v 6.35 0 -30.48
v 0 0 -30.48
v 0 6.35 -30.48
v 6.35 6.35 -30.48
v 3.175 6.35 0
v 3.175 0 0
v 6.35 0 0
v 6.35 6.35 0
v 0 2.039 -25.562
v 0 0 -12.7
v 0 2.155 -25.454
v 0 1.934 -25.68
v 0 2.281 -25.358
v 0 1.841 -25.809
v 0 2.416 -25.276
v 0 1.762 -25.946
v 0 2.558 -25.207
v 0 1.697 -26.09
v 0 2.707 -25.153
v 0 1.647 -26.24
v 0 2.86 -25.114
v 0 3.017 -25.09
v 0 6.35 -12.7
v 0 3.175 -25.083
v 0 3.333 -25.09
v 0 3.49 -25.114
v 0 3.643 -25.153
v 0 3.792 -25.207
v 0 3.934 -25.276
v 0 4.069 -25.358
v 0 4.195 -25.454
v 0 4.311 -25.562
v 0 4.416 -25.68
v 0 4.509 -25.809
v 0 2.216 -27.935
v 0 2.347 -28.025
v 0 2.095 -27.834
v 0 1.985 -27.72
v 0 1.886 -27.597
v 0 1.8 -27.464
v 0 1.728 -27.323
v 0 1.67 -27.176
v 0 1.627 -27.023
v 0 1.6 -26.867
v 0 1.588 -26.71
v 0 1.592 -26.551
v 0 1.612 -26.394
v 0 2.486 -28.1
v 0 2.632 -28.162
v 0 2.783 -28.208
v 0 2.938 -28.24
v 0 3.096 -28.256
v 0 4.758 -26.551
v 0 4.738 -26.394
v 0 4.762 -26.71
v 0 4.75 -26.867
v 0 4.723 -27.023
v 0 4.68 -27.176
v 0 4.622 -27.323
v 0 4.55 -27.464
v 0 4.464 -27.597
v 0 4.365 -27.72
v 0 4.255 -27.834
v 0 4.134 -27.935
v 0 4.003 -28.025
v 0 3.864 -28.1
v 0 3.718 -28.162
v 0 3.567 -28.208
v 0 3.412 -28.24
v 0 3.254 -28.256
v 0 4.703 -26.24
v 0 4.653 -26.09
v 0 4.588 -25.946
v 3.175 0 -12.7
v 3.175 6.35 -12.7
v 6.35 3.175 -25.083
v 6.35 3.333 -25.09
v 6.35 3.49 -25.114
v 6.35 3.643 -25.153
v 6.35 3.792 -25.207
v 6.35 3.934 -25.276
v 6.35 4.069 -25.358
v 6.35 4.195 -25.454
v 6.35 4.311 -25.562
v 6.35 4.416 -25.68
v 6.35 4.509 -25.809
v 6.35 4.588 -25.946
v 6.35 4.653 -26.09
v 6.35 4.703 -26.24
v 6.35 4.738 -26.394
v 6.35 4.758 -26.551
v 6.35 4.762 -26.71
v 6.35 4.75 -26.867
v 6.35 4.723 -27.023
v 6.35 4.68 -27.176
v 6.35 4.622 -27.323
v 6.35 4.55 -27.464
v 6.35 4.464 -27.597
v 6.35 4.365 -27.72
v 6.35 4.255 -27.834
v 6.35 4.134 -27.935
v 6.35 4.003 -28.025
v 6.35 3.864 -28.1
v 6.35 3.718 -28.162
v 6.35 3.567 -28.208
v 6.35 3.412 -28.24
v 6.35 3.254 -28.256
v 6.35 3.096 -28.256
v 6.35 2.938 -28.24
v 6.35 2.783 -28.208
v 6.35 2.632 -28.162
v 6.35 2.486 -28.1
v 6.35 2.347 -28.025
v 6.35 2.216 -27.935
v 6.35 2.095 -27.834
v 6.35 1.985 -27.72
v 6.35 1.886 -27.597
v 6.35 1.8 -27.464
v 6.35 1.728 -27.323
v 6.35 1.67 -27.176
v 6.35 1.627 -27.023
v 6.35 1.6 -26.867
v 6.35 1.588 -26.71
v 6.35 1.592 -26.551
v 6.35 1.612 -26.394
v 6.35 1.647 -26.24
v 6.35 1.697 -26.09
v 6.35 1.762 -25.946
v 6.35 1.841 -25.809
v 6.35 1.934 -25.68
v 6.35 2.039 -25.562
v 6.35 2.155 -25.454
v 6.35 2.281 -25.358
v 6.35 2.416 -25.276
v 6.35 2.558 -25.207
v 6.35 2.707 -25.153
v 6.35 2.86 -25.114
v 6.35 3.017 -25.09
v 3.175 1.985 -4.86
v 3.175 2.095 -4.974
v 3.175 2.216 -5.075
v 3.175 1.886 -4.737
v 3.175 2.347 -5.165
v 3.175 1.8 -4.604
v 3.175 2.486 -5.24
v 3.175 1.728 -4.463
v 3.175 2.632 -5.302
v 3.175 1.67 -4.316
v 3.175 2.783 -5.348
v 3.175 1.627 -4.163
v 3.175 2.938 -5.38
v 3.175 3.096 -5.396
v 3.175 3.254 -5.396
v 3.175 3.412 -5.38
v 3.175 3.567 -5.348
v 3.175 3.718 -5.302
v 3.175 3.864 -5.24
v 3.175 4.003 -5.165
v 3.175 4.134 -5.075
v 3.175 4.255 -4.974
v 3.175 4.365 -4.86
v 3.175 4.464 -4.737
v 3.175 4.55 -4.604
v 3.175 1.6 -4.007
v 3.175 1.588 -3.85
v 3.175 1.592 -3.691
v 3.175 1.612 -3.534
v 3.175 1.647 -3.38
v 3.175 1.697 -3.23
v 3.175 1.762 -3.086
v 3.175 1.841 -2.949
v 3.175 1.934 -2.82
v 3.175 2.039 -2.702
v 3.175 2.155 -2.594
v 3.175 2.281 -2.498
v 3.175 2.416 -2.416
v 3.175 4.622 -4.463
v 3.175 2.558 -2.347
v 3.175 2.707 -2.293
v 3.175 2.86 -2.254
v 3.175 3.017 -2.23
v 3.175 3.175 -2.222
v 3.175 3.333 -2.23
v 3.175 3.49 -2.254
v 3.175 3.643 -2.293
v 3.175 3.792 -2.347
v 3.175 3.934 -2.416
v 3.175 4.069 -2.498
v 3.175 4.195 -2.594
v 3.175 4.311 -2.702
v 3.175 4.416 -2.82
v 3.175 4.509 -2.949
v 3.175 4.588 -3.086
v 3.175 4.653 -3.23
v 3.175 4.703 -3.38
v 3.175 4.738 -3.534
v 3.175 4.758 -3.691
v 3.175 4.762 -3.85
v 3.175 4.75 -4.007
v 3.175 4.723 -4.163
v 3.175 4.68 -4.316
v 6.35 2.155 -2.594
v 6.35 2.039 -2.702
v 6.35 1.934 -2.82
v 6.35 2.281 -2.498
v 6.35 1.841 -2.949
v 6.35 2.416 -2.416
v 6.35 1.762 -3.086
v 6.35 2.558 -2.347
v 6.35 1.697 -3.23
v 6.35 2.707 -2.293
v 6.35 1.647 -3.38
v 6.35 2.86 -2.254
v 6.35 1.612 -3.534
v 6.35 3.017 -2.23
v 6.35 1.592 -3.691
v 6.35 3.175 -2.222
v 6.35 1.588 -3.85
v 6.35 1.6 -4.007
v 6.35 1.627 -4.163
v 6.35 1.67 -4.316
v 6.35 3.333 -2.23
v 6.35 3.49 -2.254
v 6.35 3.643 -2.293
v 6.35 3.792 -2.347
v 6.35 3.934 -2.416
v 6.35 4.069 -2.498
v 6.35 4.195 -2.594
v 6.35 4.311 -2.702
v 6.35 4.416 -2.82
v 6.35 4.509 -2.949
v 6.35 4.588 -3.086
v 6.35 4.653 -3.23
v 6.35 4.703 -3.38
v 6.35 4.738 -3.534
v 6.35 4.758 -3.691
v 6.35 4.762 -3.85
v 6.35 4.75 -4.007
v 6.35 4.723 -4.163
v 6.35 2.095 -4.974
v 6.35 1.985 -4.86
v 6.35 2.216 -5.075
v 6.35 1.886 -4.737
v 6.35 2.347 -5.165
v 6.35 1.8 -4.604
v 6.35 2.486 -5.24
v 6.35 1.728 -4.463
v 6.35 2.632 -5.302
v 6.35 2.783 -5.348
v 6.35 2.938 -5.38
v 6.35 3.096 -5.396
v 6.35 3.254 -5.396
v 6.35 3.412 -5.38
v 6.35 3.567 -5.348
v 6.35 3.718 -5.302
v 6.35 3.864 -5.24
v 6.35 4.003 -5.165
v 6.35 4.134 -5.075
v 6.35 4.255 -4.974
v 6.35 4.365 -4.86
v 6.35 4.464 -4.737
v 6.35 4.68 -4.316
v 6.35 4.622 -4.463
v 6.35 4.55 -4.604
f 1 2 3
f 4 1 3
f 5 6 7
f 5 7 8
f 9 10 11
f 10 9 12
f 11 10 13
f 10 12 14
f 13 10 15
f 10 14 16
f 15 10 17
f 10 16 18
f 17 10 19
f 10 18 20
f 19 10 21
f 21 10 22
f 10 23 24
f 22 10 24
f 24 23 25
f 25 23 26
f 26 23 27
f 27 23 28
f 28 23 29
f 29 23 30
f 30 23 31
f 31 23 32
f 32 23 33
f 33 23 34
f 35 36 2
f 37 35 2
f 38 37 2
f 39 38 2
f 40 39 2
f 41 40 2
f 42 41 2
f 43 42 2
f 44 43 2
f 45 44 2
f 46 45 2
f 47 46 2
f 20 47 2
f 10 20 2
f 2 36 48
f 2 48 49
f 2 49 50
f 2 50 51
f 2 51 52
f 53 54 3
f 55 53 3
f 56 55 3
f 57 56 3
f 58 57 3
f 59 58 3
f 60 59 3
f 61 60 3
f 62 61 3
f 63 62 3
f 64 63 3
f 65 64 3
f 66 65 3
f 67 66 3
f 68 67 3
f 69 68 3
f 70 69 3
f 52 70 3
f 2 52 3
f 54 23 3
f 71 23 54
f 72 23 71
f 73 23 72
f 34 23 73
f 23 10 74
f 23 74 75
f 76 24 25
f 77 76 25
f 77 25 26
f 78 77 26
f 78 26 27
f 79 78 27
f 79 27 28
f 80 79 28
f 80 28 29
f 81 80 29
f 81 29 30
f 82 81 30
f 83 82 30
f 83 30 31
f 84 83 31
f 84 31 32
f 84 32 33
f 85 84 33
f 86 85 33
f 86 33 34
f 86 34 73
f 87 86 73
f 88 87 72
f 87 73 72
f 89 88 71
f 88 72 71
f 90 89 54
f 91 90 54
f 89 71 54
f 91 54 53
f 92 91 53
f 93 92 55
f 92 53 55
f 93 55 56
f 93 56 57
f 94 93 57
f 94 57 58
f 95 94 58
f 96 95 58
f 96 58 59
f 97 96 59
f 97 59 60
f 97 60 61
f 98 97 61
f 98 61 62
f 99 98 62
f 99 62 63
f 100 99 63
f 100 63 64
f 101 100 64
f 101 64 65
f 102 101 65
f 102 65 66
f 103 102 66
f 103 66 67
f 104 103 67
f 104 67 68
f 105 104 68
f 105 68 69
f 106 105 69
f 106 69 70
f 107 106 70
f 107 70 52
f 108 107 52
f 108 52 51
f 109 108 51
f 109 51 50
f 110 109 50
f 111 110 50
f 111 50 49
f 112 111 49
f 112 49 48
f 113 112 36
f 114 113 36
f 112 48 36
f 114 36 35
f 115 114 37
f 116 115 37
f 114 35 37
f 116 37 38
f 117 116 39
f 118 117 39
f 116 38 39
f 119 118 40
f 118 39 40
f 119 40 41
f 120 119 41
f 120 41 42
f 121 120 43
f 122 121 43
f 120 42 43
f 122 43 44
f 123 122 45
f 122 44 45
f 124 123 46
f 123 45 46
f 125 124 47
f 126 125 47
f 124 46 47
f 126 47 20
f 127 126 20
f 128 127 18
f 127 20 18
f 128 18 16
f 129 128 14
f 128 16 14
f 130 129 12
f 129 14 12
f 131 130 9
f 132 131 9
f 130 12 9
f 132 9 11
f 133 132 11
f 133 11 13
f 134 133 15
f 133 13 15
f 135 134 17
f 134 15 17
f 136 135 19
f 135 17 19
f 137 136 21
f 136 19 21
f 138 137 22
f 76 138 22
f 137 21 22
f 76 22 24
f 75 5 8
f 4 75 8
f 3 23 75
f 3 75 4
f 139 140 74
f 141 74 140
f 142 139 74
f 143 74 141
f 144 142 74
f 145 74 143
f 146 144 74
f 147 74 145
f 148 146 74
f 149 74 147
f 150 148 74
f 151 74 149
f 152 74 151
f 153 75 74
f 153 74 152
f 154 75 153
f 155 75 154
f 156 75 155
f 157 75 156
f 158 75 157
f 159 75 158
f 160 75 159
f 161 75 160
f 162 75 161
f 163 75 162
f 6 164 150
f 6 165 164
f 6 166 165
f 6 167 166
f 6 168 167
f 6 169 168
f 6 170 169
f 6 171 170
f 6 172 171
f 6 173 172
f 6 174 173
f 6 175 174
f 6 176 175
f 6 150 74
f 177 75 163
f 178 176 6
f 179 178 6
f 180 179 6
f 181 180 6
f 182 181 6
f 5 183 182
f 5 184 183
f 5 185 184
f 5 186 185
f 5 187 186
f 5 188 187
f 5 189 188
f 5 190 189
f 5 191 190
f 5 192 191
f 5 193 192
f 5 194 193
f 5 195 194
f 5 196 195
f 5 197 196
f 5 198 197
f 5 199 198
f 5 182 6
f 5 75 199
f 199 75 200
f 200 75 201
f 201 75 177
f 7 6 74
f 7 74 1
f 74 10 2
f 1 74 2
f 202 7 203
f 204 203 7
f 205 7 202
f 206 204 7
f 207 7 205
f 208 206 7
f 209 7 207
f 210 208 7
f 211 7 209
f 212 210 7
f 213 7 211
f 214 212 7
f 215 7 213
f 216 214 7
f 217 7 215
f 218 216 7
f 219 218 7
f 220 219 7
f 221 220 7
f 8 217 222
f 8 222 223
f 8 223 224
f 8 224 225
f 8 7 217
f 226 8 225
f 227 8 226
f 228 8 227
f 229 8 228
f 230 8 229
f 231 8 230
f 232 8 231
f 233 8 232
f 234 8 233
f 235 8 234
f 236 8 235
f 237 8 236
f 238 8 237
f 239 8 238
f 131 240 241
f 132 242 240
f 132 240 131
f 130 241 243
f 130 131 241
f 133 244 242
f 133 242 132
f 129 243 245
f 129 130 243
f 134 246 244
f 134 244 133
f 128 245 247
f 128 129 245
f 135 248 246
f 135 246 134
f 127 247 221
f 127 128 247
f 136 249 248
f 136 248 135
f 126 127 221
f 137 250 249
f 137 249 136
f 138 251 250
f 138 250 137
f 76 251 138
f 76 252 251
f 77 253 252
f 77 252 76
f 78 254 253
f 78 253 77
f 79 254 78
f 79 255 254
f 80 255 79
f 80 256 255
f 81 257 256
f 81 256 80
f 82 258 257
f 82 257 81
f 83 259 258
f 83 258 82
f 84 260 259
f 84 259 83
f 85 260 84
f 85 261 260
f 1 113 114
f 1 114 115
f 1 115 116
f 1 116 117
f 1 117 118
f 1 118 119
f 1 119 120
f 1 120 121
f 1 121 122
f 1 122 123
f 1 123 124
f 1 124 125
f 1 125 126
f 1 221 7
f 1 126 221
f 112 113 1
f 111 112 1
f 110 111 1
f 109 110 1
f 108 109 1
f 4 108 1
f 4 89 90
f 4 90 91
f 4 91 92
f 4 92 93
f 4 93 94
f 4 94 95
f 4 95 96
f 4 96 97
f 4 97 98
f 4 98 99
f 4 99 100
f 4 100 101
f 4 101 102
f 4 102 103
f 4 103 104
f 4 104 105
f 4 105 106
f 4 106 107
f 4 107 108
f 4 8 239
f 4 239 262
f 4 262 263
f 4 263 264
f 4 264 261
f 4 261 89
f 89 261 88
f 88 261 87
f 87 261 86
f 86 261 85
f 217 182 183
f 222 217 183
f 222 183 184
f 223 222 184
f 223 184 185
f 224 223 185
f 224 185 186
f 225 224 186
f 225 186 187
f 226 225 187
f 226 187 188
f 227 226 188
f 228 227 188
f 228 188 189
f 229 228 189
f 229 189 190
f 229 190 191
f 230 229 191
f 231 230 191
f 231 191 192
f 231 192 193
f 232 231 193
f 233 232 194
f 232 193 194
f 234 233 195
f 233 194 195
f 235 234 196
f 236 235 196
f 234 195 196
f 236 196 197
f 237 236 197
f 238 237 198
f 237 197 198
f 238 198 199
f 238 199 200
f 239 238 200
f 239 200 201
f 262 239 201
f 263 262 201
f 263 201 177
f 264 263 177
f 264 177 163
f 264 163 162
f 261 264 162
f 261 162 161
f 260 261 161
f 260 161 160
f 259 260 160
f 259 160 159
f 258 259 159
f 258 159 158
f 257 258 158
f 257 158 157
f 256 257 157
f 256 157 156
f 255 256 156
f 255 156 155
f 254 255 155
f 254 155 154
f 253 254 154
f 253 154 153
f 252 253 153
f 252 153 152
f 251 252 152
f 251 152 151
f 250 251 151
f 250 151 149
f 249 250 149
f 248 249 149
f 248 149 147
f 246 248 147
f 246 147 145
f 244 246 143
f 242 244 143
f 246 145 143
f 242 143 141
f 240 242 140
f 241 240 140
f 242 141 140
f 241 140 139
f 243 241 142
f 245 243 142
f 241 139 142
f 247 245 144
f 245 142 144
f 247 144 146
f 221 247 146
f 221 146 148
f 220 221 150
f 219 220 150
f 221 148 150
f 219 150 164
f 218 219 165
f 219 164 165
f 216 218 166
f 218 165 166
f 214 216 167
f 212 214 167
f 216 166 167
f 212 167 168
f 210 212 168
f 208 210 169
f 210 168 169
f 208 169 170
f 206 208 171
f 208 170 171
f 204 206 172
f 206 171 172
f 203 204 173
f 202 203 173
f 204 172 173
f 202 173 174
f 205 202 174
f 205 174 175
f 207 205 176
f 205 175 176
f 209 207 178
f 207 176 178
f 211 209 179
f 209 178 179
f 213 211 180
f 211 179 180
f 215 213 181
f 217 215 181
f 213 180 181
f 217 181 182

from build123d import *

# Parameters (mm, degrees)
SKETCH1_W                        = 30.48
SKETCH1_H                        = 6.35
BOSS_EXTRUDE1_DEPTH              = 6.35
F_1_8_0_125_DIAMETER_HOLE1_D     = 3.175
F_1_8_0_125_DIAMETER_HOLE1_DEPTH = 70.104
F_1_8_0_125_DIAMETER_HOLE1_TIP   = 0.953866233
SKETCH4_W                        = 12.7
SKETCH4_H                        = 6.35
CUT_EXTRUDE1_DEPTH               = 3.175
F_1_8_0_125_DIAMETER_HOLE2_D     = 3.175
F_1_8_0_125_DIAMETER_HOLE2_DEPTH = 70.104
F_1_8_0_125_DIAMETER_HOLE2_TIP   = 0.953866233


with BuildPart() as part:
    # Sketch1 → Boss-Extrude1 (new body)
    with BuildSketch(Plane(origin=(0, 0, 0), x_dir=(0, 0, -1), z_dir=(1, 0, 0))):
        with Locations((15.24, 3.175)):
            Rectangle(SKETCH1_W, SKETCH1_H)
    extrude(amount=BOSS_EXTRUDE1_DEPTH)

    # 1/8 (0.125) Diameter Hole1
    with Locations(Plane(origin=(6.35, 0, 0), x_dir=(0, 0, -1), z_dir=(1, 0, 0))):
        with Locations((3.81, 3.175)):
            Hole(F_1_8_0_125_DIAMETER_HOLE1_D / 2, depth=F_1_8_0_125_DIAMETER_HOLE1_DEPTH)
            with Locations((0, 0, -(F_1_8_0_125_DIAMETER_HOLE1_DEPTH + F_1_8_0_125_DIAMETER_HOLE1_TIP / 2))):  # 118° drill point
                Cone(0, F_1_8_0_125_DIAMETER_HOLE1_D / 2, F_1_8_0_125_DIAMETER_HOLE1_TIP, mode=Mode.SUBTRACT)

    # Sketch4 → Cut-Extrude1 (cut)
    with BuildSketch(Plane.ZY):
        with Locations((-6.35, 3.175)):
            Rectangle(SKETCH4_W, SKETCH4_H)
    extrude(amount=-CUT_EXTRUDE1_DEPTH, mode=Mode.SUBTRACT)

    # 1/8 (0.125) Diameter Hole2
    with Locations(Plane(origin=(6.35, 0, 0), x_dir=(0, 0, -1), z_dir=(1, 0, 0))):
        with Locations((26.67, 3.175), (33.02, 3.175)):
            Hole(F_1_8_0_125_DIAMETER_HOLE2_D / 2, depth=F_1_8_0_125_DIAMETER_HOLE2_DEPTH)
            with Locations((0, 0, -(F_1_8_0_125_DIAMETER_HOLE2_DEPTH + F_1_8_0_125_DIAMETER_HOLE2_TIP / 2))):  # 118° drill point
                Cone(0, F_1_8_0_125_DIAMETER_HOLE2_D / 2, F_1_8_0_125_DIAMETER_HOLE2_TIP, mode=Mode.SUBTRACT)


solid = part.part
